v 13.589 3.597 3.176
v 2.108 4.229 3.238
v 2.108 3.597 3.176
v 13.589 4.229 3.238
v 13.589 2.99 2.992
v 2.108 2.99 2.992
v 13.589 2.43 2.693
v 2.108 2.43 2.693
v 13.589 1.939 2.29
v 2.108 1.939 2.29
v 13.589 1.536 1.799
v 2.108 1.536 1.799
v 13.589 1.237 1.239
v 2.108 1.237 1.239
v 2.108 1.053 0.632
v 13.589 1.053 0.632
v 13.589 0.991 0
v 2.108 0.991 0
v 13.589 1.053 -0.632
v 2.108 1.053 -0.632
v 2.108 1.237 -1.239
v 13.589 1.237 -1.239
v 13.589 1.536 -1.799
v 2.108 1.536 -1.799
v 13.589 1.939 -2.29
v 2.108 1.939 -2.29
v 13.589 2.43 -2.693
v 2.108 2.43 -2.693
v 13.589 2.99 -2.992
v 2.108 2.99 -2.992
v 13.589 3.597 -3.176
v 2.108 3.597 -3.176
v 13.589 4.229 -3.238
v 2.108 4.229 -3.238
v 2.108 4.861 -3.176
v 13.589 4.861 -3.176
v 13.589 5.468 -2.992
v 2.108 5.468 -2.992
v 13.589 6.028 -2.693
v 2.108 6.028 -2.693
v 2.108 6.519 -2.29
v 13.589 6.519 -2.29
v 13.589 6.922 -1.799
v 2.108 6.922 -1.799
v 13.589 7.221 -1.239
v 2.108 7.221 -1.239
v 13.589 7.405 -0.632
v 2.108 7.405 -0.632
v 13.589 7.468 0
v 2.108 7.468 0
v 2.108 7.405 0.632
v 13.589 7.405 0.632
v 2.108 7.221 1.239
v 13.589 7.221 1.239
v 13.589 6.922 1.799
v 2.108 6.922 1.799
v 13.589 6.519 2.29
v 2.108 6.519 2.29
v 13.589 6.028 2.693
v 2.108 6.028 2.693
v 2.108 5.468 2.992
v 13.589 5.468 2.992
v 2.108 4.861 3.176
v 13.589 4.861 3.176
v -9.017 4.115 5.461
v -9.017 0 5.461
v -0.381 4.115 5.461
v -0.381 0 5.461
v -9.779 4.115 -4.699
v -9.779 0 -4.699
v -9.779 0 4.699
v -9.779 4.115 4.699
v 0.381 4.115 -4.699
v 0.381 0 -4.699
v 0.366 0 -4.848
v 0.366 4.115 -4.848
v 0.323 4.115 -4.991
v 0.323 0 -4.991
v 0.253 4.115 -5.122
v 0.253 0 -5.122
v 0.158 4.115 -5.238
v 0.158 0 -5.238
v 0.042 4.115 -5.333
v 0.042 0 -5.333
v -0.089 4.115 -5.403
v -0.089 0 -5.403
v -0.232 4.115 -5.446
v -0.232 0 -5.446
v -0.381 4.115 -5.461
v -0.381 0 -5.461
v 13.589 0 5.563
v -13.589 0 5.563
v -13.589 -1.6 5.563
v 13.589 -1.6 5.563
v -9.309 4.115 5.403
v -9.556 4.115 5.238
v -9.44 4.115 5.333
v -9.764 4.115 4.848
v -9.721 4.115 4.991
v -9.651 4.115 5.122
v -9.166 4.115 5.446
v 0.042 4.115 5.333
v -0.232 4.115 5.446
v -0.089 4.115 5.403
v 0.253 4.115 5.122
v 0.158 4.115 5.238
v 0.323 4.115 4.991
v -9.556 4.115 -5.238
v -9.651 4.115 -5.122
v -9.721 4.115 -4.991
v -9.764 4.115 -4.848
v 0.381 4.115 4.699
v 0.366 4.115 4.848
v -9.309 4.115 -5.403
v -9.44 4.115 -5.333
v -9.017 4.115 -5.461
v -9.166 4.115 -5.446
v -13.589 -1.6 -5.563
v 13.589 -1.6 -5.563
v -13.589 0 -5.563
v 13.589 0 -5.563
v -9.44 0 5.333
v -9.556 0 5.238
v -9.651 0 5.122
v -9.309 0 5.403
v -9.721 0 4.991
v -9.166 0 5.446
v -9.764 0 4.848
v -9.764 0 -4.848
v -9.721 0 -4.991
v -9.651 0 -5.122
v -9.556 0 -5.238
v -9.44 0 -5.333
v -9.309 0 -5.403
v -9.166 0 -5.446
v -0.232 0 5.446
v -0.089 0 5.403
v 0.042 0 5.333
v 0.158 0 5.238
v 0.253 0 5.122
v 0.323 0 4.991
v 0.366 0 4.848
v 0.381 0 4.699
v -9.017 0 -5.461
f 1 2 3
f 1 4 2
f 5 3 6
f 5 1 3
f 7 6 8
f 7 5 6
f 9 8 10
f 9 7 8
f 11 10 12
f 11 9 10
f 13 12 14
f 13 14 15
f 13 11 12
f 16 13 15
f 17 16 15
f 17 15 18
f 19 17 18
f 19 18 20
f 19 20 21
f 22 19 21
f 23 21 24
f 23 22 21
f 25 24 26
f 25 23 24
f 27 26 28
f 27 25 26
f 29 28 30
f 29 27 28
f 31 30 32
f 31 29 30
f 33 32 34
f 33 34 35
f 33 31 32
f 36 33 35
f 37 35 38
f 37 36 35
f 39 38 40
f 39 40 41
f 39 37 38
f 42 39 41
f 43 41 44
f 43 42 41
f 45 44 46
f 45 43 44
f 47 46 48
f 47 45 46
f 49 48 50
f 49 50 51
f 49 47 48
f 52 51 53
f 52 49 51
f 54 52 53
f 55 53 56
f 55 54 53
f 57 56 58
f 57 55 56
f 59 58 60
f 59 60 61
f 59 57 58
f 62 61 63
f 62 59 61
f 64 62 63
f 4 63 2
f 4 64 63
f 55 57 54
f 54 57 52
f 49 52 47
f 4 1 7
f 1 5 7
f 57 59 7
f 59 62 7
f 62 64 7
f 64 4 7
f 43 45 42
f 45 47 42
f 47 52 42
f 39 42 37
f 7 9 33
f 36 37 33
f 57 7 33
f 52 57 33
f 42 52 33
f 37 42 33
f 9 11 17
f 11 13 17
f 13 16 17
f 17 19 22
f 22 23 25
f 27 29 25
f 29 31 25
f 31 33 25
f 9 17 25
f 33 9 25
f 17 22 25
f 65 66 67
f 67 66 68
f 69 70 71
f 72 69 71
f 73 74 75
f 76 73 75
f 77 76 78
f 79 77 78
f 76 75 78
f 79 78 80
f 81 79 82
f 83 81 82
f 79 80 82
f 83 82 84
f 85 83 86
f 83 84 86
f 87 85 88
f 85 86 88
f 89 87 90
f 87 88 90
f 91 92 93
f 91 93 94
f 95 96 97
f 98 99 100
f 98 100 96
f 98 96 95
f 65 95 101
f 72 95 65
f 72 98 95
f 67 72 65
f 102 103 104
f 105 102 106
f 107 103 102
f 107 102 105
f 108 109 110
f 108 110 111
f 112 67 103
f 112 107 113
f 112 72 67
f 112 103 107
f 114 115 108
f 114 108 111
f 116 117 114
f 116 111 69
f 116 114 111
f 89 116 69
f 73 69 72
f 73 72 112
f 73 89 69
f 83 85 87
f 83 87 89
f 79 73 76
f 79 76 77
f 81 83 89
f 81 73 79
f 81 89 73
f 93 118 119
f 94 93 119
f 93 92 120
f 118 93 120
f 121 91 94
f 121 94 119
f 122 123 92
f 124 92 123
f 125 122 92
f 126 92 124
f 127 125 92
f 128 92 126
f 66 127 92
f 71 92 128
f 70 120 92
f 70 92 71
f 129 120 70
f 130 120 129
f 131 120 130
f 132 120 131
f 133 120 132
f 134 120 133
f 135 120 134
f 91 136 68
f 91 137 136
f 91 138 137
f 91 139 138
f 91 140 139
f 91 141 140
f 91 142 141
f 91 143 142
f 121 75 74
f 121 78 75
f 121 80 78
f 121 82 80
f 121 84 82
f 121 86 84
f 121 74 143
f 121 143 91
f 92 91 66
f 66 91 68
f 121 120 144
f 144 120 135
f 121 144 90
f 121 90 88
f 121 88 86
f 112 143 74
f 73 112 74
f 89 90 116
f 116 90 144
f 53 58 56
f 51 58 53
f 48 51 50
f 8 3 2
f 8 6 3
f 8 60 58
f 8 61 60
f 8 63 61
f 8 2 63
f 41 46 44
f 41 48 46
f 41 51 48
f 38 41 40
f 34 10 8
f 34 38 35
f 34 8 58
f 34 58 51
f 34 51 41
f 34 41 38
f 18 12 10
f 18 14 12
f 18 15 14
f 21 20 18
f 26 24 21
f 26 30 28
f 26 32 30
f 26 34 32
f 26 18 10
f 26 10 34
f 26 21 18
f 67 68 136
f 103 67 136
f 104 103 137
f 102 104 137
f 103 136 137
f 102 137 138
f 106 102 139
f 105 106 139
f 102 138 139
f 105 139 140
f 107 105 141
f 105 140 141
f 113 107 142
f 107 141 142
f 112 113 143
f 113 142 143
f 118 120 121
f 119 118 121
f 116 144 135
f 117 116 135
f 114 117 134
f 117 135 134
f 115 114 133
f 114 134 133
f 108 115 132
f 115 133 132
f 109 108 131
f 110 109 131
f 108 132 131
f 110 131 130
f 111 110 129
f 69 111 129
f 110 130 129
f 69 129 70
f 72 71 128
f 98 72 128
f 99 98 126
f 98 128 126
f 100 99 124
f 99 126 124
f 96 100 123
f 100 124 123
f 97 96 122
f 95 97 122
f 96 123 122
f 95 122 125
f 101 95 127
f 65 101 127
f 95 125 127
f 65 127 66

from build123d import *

# Parameters (mm, degrees)
SKETCH1_W           = 27.178
SKETCH1_H           = 11.1252
BOSS_EXTRUDE1_DEPTH = 1.6002
BOSS_EXTRUDE2_DEPTH = 4.1148
SKETCH3_W           = 11.4808
SKETCH3_H           = 3.2385


with BuildPart() as part:
    # Sketch1 → Boss-Extrude1 (new body)
    with BuildSketch(Plane(origin=(0, 0, 0), x_dir=(1, 0, 0), z_dir=(0, 1, 0))):
        Rectangle(SKETCH1_W, SKETCH1_H)
    extrude(amount=-BOSS_EXTRUDE1_DEPTH)

    # Sketch2 → Boss-Extrude2 (add)
    with BuildSketch(Plane(origin=(0, 0, 0), x_dir=(1, 0, 0), z_dir=(0, 1, 0))):
        with BuildLine():
            Line((-9.017, -5.461), (-0.381, -5.461))
            ThreePointArc((-0.381, -5.461), (0.157815367, -5.237815367), (0.381, -4.699))
            Line((0.381, -4.699), (0.381, 4.699))
            ThreePointArc((0.381, 4.699), (0.157815367, 5.237815367), (-0.381, 5.461))
            Line((-0.381, 5.461), (-9.017, 5.461))
            ThreePointArc((-9.017, 5.461), (-9.555815367, 5.237815367), (-9.779, 4.699))
            Line((-9.779, 4.699), (-9.779, -4.699))
            ThreePointArc((-9.779, -4.699), (-9.555815367, -5.237815367), (-9.017, -5.461))
        make_face()
    extrude(amount=BOSS_EXTRUDE2_DEPTH)


with BuildPart() as body_2:
    # Sketch3 → Revolve1 (revolve)
    with BuildSketch(Plane.XY, mode=Mode.PRIVATE) as revolve1_sk:
        with Locations((7.8486, 5.84835)):
            Rectangle(SKETCH3_W, SKETCH3_H)
    revolve(revolve1_sk.sketch.rotate(Axis((2.1082, 4.2291, 0), (1, 0, 0)), 90), axis=Axis((2.1082, 4.2291, 0), (1, 0, 0)))


solid = Compound([part.part, body_2.part])
